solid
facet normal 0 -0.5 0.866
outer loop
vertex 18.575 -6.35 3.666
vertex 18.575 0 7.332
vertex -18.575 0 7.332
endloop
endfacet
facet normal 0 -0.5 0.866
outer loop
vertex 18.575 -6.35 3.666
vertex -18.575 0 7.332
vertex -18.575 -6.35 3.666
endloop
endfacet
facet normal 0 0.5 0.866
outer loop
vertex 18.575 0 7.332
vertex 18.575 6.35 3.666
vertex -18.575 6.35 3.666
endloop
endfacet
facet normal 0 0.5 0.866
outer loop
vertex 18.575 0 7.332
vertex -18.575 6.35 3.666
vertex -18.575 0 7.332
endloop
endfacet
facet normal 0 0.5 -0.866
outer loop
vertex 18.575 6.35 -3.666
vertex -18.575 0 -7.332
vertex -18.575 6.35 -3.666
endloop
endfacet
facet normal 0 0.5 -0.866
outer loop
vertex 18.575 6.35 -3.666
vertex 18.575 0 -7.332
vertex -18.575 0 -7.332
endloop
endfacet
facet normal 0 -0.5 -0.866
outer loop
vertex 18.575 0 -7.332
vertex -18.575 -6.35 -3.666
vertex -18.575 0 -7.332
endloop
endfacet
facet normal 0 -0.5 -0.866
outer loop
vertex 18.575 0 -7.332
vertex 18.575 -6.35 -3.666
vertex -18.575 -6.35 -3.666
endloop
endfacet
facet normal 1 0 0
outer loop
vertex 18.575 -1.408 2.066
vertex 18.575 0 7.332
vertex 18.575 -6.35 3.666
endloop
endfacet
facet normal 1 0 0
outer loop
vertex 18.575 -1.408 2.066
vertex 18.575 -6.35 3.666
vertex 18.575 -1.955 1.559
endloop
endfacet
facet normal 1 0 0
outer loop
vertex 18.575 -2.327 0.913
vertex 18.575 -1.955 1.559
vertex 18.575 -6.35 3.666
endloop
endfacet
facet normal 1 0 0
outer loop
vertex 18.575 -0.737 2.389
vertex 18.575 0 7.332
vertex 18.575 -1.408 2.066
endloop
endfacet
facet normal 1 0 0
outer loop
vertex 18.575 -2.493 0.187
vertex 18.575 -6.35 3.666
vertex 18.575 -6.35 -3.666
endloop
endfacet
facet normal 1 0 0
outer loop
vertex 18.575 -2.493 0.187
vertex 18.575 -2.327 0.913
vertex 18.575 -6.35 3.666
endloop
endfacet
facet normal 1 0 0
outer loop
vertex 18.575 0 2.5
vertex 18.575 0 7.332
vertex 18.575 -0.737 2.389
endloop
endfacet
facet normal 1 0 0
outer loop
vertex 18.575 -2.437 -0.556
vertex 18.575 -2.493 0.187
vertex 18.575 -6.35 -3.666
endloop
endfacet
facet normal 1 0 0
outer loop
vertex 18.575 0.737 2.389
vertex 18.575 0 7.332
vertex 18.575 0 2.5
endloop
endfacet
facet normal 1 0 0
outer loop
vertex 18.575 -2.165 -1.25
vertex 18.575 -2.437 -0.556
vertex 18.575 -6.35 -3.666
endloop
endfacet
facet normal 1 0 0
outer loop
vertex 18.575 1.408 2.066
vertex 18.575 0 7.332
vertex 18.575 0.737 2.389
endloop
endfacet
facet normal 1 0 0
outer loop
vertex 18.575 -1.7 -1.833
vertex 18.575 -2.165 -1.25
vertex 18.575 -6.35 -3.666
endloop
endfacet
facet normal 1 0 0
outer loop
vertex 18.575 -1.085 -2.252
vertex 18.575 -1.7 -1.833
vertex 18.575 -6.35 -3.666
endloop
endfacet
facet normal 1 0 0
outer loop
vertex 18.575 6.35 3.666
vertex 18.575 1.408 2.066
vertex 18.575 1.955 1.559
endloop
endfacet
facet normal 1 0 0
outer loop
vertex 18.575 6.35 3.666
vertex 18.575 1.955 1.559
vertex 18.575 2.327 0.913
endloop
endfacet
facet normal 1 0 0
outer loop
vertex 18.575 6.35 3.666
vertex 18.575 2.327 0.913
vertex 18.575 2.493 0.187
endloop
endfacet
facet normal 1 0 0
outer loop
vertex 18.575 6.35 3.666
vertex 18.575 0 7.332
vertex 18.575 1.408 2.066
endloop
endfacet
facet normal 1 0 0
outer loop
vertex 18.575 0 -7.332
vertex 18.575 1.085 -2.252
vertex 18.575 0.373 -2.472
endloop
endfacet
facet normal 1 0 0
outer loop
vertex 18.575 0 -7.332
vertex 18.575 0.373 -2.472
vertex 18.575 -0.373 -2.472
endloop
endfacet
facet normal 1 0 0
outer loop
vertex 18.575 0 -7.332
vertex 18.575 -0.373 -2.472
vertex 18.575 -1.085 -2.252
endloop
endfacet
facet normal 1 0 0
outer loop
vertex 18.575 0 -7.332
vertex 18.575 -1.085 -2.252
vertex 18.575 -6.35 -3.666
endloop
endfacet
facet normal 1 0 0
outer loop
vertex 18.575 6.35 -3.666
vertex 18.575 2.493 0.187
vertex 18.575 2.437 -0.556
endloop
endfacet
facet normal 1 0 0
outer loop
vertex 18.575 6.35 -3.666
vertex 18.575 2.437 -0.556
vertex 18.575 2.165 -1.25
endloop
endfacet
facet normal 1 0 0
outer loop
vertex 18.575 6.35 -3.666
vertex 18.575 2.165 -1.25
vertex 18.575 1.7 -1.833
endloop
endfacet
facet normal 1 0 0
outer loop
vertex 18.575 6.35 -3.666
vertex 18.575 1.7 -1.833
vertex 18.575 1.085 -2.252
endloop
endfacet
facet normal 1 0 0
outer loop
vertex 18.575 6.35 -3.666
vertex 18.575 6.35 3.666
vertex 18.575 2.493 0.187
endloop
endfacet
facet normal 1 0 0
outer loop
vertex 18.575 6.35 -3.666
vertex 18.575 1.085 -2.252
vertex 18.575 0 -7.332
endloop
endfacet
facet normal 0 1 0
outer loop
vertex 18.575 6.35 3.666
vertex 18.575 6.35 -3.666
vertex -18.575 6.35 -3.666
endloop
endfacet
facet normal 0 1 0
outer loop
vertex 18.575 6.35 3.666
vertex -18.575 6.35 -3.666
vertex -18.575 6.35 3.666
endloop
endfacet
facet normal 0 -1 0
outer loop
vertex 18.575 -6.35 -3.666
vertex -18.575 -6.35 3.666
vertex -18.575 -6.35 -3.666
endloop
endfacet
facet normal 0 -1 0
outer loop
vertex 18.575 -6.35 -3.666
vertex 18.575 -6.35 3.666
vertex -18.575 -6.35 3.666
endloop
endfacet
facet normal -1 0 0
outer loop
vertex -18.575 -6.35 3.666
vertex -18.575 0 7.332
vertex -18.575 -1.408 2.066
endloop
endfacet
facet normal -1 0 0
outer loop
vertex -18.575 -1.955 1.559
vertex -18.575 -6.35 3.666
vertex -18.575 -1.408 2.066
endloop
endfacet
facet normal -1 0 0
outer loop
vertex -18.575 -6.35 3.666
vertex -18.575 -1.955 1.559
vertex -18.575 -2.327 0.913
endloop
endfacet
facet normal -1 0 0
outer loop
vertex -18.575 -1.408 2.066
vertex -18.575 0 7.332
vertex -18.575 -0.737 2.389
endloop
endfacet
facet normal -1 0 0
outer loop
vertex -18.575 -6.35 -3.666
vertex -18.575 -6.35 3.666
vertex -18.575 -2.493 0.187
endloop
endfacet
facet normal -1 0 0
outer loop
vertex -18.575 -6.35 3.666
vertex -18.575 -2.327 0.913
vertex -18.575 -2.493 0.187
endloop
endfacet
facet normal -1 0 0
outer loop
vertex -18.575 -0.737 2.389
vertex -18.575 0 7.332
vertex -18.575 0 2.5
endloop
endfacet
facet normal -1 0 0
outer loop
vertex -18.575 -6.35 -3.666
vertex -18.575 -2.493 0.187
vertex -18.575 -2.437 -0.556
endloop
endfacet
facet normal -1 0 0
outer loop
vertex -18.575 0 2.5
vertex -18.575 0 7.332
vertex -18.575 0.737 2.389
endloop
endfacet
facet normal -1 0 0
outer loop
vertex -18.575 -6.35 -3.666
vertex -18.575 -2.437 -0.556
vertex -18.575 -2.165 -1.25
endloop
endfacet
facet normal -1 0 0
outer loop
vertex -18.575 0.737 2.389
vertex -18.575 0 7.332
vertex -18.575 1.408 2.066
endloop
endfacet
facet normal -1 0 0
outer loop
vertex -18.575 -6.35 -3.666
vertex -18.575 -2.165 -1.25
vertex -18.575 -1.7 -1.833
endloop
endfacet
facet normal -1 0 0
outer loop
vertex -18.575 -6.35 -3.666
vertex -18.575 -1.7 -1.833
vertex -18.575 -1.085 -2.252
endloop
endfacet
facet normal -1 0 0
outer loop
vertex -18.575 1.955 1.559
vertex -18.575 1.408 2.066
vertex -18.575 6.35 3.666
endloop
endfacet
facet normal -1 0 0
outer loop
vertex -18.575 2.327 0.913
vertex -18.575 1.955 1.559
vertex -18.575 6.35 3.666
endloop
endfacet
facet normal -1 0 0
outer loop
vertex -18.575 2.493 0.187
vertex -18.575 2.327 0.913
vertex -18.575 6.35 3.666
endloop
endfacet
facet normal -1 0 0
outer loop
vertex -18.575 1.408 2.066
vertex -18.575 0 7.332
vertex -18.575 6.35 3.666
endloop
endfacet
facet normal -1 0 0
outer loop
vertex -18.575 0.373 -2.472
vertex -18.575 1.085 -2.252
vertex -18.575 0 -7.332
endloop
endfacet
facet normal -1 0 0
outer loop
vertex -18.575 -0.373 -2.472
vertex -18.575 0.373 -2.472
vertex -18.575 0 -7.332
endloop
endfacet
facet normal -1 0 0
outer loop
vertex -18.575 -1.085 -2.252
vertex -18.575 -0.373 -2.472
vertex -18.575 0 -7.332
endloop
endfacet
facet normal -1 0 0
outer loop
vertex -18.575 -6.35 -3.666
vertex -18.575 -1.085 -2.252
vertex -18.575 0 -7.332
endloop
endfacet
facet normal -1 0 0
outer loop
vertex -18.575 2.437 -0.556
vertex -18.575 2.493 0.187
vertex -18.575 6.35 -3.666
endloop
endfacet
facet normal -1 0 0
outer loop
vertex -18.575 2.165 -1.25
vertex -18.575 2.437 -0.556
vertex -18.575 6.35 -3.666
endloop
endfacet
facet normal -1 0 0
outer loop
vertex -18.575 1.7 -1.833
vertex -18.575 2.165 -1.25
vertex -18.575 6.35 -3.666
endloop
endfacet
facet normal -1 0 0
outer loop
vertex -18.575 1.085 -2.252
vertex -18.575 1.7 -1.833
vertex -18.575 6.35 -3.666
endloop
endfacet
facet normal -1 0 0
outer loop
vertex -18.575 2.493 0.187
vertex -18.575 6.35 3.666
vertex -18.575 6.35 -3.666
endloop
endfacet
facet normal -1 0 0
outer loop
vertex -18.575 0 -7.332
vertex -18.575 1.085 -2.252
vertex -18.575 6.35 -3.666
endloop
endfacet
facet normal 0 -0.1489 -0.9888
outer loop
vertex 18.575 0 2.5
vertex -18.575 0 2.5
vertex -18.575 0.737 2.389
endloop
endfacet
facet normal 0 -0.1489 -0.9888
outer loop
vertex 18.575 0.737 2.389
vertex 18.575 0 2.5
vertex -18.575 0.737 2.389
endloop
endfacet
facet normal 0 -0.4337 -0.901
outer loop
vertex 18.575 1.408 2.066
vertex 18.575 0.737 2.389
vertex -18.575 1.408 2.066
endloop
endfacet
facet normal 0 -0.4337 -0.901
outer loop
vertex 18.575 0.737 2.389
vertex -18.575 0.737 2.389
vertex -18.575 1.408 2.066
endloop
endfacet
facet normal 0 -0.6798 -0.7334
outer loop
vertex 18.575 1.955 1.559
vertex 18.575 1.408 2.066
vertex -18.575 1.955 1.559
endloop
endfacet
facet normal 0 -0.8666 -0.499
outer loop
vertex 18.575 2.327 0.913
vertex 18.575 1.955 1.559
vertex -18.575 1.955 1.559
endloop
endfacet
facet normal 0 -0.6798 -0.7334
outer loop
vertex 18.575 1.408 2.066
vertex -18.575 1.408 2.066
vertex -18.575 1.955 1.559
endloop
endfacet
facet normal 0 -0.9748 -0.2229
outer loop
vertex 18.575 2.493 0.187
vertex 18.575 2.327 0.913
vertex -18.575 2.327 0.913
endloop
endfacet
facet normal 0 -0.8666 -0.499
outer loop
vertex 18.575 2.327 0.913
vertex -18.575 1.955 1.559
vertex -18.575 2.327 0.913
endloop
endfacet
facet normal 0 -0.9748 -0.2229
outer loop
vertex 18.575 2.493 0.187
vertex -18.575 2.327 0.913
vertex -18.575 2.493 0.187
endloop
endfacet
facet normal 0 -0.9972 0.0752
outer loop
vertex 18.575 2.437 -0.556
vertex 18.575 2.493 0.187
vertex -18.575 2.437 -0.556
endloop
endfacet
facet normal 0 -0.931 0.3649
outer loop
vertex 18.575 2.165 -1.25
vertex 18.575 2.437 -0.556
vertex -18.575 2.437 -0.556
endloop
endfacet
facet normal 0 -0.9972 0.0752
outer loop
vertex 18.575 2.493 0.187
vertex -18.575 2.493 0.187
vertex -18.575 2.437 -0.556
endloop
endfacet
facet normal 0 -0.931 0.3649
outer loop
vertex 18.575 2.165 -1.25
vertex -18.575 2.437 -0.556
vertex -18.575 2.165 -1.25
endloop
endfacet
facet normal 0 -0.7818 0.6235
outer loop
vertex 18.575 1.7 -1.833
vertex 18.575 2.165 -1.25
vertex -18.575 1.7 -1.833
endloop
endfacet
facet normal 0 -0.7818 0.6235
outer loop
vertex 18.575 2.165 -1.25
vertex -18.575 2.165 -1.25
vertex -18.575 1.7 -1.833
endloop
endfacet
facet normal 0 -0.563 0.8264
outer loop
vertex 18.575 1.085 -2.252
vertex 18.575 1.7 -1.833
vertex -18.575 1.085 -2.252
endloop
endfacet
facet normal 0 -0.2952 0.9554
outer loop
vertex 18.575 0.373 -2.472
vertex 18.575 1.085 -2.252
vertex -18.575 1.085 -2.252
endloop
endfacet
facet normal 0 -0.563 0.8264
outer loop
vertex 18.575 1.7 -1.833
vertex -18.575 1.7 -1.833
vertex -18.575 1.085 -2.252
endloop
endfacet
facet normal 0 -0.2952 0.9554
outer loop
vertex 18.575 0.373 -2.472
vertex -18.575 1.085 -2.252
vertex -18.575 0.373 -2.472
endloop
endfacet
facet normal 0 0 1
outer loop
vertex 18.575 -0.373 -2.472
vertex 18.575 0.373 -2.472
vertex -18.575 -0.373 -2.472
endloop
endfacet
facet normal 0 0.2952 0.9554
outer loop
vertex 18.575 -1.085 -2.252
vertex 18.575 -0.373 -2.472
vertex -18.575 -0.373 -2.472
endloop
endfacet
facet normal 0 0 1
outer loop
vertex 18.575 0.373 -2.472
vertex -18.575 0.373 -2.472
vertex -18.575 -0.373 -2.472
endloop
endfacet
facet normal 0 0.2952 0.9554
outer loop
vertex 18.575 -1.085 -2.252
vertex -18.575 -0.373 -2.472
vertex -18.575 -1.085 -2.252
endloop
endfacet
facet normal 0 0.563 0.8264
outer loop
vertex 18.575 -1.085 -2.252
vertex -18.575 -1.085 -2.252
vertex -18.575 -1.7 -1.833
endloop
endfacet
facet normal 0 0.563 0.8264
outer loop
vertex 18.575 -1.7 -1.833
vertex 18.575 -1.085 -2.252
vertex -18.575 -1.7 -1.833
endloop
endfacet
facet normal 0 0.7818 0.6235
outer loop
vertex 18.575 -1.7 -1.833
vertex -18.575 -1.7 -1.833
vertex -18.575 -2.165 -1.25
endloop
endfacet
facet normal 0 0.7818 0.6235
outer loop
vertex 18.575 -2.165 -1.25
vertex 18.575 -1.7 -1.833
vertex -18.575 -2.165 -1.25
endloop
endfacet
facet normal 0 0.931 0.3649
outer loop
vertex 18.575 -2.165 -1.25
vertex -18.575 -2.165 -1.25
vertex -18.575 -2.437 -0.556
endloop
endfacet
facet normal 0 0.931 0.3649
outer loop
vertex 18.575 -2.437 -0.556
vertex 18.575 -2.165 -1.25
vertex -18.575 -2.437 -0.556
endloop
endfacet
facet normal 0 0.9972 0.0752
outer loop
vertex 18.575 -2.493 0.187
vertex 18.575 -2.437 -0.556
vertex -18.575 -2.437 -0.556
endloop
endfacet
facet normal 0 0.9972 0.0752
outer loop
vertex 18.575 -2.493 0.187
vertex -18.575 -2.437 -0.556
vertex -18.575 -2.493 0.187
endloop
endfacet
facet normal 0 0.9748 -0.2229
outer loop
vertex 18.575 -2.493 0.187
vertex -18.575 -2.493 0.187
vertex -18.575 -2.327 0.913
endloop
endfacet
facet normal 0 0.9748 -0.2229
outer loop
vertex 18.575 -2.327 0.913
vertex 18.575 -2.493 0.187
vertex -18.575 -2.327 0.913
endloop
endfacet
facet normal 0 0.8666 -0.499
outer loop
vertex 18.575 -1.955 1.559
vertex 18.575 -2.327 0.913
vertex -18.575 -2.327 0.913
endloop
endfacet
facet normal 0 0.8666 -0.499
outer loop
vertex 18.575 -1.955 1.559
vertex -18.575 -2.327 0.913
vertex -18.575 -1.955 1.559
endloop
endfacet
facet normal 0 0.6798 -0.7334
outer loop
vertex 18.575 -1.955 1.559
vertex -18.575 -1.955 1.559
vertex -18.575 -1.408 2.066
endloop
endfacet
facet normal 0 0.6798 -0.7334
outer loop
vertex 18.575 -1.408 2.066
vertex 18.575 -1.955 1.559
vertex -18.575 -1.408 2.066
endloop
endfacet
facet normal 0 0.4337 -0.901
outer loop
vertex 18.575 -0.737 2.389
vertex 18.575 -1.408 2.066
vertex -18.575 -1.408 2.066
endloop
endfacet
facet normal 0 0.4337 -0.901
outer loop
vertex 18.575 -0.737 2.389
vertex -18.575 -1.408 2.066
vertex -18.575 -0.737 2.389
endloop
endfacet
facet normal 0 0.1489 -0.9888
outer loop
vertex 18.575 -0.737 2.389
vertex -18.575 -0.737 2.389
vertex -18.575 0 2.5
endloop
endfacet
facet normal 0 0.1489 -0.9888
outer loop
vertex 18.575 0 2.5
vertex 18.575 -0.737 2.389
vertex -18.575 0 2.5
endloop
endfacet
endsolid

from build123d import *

# Parameters (mm, degrees)
BOSS_EXTRUDE1_DEPTH = 18.575
SKETCH3_R           = 2.5
CUT_EXTRUDE1_DEPTH  = 39.395420734


with BuildPart() as part:
    # Sketch2 → Boss-Extrude1 (new, symmetric)
    with BuildSketch(Plane(origin=(0, 0, 0), x_dir=(0, 0, -1), z_dir=(1, 0, 0))):
        Polygon((7.332348419, 0), (3.666174209, 6.35), (-3.666174209, 6.35), (-7.332348419, 0), (-3.666174209, -6.35), (3.666174209, -6.35), align=None)
    extrude(amount=BOSS_EXTRUDE1_DEPTH, both=True)

    # Sketch3 → Cut-Extrude1 (cut, through all)
    with BuildSketch(Plane.ZY.offset(18.575)):
        Circle(SKETCH3_R)
    extrude(amount=-CUT_EXTRUDE1_DEPTH, mode=Mode.SUBTRACT)


solid = part.part
